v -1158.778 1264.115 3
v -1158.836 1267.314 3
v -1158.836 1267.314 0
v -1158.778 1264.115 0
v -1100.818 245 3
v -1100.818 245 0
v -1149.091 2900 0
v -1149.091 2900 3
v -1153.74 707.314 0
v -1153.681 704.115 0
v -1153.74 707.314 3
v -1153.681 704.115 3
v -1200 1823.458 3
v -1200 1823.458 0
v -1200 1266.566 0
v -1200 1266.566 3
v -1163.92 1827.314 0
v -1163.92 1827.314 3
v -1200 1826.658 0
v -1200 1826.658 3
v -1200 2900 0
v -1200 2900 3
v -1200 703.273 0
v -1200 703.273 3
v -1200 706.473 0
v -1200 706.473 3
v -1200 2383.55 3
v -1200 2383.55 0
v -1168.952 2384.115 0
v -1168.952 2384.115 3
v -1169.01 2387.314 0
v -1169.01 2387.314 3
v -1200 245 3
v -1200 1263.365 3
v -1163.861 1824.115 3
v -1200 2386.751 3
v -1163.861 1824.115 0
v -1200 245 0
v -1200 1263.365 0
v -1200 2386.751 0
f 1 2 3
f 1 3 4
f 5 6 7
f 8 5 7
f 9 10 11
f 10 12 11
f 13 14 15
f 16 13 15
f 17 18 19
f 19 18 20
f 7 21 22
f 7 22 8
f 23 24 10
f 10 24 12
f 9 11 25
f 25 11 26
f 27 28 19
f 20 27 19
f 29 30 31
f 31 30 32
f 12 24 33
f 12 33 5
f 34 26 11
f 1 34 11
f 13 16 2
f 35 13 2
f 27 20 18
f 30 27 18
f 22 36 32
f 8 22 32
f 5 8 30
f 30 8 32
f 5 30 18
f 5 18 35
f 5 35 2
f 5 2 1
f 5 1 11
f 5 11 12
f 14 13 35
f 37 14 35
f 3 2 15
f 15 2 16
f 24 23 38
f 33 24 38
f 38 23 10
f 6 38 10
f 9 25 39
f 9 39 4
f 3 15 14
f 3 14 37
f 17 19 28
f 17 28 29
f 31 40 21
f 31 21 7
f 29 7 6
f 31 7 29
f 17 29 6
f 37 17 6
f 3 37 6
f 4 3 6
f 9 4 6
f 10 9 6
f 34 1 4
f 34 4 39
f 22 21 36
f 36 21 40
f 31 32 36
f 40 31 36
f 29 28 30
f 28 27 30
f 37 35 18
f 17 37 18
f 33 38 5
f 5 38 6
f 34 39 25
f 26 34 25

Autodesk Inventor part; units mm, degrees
ref_plane "YZ Plane" through (0, 0, 0) normal (1, 0, 0) x (0, 1, 0)
ref_plane "XZ Plane" through (0, 0, 0) normal (0, 1, 0) x (-1, 0, 0)
ref_plane "XY Plane" through (0, 0, 0) normal (0, 0, 1) x (1, 0, 0)
sketch "Sketch1" plane through (0, 0, 0) normal (0, 0, 1) x (1, 0, 0)
  line L0 (1200, 2950) -> (-1200, 2950)
  line L1 (-1200, 2950) -> (-1200, 0)
  line L2 (-1200, 0) -> (1200, 0)
  line L3 (1200, 0) -> (1200, 2950)
  line L4 (1150, 2950) -> (1150, 0)
  line L5 (-1150, 0) -> (-1150, 2950) construction
  line L6 (0, 2950) -> (0, 50) construction
  line L7 (-1100, 200) -> (-950, 50)
  line L8 (-1200, 100) -> (-1100, 100)
  line L9 (-1100, 100) -> (-1100, 0)
  line L10 (-1100, 200) -> (-1150, 2950)
  arc A0 (-1100.4545, 224.9959) -> (-1082.3223, 182.3223) centre (-1100, 200) ccw
  arc A1 (-1082.3223, 182.3223) -> (-1100.4545, 224.9959) centre (-1100, 200) ccw construction
  line L11 (-1200, 255) -> (-1101, 255) construction
  line L12 (0, 50) -> (-950, 50)
  line L13 (0, 50) -> (0, 0)
  line L14 (1505.3449, -225.894) -> (355.3449, -225.894)
  line L15 (-1200, 245) -> (-1100.8182, 245)
  line L16 (-1200, 2900) -> (-1149.0909, 2900)
  dimension "d3" = 2400
  dimension "d4" = 2950
  dimension "d5" = 50
  dimension "d6" = 100
  dimension "d7" = 50
  dimension "d9" = 135
  dimension "d10" = 950
  dimension "d11" = 1150
  dimension "d12" = 136.042
  dimension "d13" = 50
  dimension "d14" = 100
  dimension "d15" = 212.132
  dimension "d17" = 55
  dimension "d20" = 200
  dimension "d50" = 2705
  dimension "d53" = 50
extrude "Plate1" add sketch "Sketch1" along normal blind 3 contours L10 L15 L1 L16
sketch "Sketch2" plane through (0, 0, 3) normal (0, 0, 1) x (1, 0, 0)
  line L0 (-1149.0909, 2900) -> (-1100.8182, 245) projected
  line L1 (-1200, 245) -> (-1200, 2900) projected
  line L2 (-1100.8182, 245) -> (-1150, 2950) projected
  line L3 (-1158.8362, 1267.3142) -> (-1158.778, 1264.1148)
  line L4 (-1158.778, 1264.1148) -> (-1119.3606, 1264.8314) construction
  line L5 (-1150, 2950) -> (-1100.8182, 245) projected
  line L6 (-1158.778, 1264.1148) -> (-1200, 1263.3653)
  line L7 (-1158.8362, 1267.3142) -> (-1200, 1266.5658)
  line L8 (-1200, 703.2727) -> (-1153.6813, 704.1149)
  line L9 (-1153.6813, 704.1149) -> (-1153.7395, 707.3144)
  line L10 (-1153.6813, 704.1149) -> (-1109.1804, 704.924) construction
  line L11 (-1153.7395, 707.3144) -> (-1200, 706.4732)
  line L12 (-1200, 1823.4578) -> (-1163.8614, 1824.1149)
  line L13 (-1163.8614, 1824.1149) -> (-1163.9196, 1827.3144)
  line L14 (-1163.9196, 1827.3144) -> (-1200, 1826.6584)
  line L15 (-1163.8614, 1824.1149) -> (-1129.5407, 1824.7389) construction
  line L16 (-1200, 2383.5504) -> (-1168.9515, 2384.1149)
  line L17 (-1168.9515, 2384.1149) -> (-1169.0097, 2387.3144)
  line L18 (-1168.9515, 2384.1149) -> (-1139.7208, 2384.6464) construction
  line L19 (-1169.0097, 2387.3144) -> (-1200, 2386.7509)
  line L20 (-1100.8182, 245) -> (-1200, 245) projected
  line L21 (-1200, 2900) -> (-1149.0909, 2900) projected
  point P0 (0, 0)
  dimension "d34" = 46.3264
  dimension "d36" = 41.2288
  dimension "d39" = 36.1445
  dimension "d42" = 31.0536
  dimension "d43" = 560
  dimension "d44" = 3.2
  dimension "d45" = 560
  dimension "d46" = 3.2
  dimension "d47" = 560
  dimension "d48" = 3.2
  dimension "d49" = 3.2
  dimension "d52" = 460
extrude "Extrusion1" cut sketch "Sketch2" against normal through all contours L19 L17 L16 L1 | L1 L11 L9 L8 | L14 L13 L12 L1 | L1 L7 L3 L6
equation "\"d11\" = d10 + d18"
equation "\"d14\" = d6"
equation "\"d43\" = Stringer1_step"
equation "\"d45\" = Stringer1_step"
equation "\"d47\" = Stringer1_step"
equation "\"d52\" = Stringer1_hight"
equation "\"d2\" = Thickness"
equation "\"BendReliefWidth\" = Thickness"
equation "\"BendReliefDepth\" = 0.5 * Thickness"
equation "\"CornerReliefSize\" = 4 * Thickness"
equation "\"MinimumRemnant\" = 2 * Thickness"
equation "\"TransitionRadius\" = BendRadius"
equation "\"JacobiRadiusSize\" = BendRadius"
equation "\"GapSize\" = Thickness"
equation "\"d18\" = d19"
equation "\"Stringer1_step\" = 560"
equation "\"Stringer1_hight\" = 460"
equation "\"Thickness\" = 3"
equation "\"BendRadius\" = 5"
equation "\"d19\" = 200"
properties part number "BSH 022 rib board" material "09g2s"
